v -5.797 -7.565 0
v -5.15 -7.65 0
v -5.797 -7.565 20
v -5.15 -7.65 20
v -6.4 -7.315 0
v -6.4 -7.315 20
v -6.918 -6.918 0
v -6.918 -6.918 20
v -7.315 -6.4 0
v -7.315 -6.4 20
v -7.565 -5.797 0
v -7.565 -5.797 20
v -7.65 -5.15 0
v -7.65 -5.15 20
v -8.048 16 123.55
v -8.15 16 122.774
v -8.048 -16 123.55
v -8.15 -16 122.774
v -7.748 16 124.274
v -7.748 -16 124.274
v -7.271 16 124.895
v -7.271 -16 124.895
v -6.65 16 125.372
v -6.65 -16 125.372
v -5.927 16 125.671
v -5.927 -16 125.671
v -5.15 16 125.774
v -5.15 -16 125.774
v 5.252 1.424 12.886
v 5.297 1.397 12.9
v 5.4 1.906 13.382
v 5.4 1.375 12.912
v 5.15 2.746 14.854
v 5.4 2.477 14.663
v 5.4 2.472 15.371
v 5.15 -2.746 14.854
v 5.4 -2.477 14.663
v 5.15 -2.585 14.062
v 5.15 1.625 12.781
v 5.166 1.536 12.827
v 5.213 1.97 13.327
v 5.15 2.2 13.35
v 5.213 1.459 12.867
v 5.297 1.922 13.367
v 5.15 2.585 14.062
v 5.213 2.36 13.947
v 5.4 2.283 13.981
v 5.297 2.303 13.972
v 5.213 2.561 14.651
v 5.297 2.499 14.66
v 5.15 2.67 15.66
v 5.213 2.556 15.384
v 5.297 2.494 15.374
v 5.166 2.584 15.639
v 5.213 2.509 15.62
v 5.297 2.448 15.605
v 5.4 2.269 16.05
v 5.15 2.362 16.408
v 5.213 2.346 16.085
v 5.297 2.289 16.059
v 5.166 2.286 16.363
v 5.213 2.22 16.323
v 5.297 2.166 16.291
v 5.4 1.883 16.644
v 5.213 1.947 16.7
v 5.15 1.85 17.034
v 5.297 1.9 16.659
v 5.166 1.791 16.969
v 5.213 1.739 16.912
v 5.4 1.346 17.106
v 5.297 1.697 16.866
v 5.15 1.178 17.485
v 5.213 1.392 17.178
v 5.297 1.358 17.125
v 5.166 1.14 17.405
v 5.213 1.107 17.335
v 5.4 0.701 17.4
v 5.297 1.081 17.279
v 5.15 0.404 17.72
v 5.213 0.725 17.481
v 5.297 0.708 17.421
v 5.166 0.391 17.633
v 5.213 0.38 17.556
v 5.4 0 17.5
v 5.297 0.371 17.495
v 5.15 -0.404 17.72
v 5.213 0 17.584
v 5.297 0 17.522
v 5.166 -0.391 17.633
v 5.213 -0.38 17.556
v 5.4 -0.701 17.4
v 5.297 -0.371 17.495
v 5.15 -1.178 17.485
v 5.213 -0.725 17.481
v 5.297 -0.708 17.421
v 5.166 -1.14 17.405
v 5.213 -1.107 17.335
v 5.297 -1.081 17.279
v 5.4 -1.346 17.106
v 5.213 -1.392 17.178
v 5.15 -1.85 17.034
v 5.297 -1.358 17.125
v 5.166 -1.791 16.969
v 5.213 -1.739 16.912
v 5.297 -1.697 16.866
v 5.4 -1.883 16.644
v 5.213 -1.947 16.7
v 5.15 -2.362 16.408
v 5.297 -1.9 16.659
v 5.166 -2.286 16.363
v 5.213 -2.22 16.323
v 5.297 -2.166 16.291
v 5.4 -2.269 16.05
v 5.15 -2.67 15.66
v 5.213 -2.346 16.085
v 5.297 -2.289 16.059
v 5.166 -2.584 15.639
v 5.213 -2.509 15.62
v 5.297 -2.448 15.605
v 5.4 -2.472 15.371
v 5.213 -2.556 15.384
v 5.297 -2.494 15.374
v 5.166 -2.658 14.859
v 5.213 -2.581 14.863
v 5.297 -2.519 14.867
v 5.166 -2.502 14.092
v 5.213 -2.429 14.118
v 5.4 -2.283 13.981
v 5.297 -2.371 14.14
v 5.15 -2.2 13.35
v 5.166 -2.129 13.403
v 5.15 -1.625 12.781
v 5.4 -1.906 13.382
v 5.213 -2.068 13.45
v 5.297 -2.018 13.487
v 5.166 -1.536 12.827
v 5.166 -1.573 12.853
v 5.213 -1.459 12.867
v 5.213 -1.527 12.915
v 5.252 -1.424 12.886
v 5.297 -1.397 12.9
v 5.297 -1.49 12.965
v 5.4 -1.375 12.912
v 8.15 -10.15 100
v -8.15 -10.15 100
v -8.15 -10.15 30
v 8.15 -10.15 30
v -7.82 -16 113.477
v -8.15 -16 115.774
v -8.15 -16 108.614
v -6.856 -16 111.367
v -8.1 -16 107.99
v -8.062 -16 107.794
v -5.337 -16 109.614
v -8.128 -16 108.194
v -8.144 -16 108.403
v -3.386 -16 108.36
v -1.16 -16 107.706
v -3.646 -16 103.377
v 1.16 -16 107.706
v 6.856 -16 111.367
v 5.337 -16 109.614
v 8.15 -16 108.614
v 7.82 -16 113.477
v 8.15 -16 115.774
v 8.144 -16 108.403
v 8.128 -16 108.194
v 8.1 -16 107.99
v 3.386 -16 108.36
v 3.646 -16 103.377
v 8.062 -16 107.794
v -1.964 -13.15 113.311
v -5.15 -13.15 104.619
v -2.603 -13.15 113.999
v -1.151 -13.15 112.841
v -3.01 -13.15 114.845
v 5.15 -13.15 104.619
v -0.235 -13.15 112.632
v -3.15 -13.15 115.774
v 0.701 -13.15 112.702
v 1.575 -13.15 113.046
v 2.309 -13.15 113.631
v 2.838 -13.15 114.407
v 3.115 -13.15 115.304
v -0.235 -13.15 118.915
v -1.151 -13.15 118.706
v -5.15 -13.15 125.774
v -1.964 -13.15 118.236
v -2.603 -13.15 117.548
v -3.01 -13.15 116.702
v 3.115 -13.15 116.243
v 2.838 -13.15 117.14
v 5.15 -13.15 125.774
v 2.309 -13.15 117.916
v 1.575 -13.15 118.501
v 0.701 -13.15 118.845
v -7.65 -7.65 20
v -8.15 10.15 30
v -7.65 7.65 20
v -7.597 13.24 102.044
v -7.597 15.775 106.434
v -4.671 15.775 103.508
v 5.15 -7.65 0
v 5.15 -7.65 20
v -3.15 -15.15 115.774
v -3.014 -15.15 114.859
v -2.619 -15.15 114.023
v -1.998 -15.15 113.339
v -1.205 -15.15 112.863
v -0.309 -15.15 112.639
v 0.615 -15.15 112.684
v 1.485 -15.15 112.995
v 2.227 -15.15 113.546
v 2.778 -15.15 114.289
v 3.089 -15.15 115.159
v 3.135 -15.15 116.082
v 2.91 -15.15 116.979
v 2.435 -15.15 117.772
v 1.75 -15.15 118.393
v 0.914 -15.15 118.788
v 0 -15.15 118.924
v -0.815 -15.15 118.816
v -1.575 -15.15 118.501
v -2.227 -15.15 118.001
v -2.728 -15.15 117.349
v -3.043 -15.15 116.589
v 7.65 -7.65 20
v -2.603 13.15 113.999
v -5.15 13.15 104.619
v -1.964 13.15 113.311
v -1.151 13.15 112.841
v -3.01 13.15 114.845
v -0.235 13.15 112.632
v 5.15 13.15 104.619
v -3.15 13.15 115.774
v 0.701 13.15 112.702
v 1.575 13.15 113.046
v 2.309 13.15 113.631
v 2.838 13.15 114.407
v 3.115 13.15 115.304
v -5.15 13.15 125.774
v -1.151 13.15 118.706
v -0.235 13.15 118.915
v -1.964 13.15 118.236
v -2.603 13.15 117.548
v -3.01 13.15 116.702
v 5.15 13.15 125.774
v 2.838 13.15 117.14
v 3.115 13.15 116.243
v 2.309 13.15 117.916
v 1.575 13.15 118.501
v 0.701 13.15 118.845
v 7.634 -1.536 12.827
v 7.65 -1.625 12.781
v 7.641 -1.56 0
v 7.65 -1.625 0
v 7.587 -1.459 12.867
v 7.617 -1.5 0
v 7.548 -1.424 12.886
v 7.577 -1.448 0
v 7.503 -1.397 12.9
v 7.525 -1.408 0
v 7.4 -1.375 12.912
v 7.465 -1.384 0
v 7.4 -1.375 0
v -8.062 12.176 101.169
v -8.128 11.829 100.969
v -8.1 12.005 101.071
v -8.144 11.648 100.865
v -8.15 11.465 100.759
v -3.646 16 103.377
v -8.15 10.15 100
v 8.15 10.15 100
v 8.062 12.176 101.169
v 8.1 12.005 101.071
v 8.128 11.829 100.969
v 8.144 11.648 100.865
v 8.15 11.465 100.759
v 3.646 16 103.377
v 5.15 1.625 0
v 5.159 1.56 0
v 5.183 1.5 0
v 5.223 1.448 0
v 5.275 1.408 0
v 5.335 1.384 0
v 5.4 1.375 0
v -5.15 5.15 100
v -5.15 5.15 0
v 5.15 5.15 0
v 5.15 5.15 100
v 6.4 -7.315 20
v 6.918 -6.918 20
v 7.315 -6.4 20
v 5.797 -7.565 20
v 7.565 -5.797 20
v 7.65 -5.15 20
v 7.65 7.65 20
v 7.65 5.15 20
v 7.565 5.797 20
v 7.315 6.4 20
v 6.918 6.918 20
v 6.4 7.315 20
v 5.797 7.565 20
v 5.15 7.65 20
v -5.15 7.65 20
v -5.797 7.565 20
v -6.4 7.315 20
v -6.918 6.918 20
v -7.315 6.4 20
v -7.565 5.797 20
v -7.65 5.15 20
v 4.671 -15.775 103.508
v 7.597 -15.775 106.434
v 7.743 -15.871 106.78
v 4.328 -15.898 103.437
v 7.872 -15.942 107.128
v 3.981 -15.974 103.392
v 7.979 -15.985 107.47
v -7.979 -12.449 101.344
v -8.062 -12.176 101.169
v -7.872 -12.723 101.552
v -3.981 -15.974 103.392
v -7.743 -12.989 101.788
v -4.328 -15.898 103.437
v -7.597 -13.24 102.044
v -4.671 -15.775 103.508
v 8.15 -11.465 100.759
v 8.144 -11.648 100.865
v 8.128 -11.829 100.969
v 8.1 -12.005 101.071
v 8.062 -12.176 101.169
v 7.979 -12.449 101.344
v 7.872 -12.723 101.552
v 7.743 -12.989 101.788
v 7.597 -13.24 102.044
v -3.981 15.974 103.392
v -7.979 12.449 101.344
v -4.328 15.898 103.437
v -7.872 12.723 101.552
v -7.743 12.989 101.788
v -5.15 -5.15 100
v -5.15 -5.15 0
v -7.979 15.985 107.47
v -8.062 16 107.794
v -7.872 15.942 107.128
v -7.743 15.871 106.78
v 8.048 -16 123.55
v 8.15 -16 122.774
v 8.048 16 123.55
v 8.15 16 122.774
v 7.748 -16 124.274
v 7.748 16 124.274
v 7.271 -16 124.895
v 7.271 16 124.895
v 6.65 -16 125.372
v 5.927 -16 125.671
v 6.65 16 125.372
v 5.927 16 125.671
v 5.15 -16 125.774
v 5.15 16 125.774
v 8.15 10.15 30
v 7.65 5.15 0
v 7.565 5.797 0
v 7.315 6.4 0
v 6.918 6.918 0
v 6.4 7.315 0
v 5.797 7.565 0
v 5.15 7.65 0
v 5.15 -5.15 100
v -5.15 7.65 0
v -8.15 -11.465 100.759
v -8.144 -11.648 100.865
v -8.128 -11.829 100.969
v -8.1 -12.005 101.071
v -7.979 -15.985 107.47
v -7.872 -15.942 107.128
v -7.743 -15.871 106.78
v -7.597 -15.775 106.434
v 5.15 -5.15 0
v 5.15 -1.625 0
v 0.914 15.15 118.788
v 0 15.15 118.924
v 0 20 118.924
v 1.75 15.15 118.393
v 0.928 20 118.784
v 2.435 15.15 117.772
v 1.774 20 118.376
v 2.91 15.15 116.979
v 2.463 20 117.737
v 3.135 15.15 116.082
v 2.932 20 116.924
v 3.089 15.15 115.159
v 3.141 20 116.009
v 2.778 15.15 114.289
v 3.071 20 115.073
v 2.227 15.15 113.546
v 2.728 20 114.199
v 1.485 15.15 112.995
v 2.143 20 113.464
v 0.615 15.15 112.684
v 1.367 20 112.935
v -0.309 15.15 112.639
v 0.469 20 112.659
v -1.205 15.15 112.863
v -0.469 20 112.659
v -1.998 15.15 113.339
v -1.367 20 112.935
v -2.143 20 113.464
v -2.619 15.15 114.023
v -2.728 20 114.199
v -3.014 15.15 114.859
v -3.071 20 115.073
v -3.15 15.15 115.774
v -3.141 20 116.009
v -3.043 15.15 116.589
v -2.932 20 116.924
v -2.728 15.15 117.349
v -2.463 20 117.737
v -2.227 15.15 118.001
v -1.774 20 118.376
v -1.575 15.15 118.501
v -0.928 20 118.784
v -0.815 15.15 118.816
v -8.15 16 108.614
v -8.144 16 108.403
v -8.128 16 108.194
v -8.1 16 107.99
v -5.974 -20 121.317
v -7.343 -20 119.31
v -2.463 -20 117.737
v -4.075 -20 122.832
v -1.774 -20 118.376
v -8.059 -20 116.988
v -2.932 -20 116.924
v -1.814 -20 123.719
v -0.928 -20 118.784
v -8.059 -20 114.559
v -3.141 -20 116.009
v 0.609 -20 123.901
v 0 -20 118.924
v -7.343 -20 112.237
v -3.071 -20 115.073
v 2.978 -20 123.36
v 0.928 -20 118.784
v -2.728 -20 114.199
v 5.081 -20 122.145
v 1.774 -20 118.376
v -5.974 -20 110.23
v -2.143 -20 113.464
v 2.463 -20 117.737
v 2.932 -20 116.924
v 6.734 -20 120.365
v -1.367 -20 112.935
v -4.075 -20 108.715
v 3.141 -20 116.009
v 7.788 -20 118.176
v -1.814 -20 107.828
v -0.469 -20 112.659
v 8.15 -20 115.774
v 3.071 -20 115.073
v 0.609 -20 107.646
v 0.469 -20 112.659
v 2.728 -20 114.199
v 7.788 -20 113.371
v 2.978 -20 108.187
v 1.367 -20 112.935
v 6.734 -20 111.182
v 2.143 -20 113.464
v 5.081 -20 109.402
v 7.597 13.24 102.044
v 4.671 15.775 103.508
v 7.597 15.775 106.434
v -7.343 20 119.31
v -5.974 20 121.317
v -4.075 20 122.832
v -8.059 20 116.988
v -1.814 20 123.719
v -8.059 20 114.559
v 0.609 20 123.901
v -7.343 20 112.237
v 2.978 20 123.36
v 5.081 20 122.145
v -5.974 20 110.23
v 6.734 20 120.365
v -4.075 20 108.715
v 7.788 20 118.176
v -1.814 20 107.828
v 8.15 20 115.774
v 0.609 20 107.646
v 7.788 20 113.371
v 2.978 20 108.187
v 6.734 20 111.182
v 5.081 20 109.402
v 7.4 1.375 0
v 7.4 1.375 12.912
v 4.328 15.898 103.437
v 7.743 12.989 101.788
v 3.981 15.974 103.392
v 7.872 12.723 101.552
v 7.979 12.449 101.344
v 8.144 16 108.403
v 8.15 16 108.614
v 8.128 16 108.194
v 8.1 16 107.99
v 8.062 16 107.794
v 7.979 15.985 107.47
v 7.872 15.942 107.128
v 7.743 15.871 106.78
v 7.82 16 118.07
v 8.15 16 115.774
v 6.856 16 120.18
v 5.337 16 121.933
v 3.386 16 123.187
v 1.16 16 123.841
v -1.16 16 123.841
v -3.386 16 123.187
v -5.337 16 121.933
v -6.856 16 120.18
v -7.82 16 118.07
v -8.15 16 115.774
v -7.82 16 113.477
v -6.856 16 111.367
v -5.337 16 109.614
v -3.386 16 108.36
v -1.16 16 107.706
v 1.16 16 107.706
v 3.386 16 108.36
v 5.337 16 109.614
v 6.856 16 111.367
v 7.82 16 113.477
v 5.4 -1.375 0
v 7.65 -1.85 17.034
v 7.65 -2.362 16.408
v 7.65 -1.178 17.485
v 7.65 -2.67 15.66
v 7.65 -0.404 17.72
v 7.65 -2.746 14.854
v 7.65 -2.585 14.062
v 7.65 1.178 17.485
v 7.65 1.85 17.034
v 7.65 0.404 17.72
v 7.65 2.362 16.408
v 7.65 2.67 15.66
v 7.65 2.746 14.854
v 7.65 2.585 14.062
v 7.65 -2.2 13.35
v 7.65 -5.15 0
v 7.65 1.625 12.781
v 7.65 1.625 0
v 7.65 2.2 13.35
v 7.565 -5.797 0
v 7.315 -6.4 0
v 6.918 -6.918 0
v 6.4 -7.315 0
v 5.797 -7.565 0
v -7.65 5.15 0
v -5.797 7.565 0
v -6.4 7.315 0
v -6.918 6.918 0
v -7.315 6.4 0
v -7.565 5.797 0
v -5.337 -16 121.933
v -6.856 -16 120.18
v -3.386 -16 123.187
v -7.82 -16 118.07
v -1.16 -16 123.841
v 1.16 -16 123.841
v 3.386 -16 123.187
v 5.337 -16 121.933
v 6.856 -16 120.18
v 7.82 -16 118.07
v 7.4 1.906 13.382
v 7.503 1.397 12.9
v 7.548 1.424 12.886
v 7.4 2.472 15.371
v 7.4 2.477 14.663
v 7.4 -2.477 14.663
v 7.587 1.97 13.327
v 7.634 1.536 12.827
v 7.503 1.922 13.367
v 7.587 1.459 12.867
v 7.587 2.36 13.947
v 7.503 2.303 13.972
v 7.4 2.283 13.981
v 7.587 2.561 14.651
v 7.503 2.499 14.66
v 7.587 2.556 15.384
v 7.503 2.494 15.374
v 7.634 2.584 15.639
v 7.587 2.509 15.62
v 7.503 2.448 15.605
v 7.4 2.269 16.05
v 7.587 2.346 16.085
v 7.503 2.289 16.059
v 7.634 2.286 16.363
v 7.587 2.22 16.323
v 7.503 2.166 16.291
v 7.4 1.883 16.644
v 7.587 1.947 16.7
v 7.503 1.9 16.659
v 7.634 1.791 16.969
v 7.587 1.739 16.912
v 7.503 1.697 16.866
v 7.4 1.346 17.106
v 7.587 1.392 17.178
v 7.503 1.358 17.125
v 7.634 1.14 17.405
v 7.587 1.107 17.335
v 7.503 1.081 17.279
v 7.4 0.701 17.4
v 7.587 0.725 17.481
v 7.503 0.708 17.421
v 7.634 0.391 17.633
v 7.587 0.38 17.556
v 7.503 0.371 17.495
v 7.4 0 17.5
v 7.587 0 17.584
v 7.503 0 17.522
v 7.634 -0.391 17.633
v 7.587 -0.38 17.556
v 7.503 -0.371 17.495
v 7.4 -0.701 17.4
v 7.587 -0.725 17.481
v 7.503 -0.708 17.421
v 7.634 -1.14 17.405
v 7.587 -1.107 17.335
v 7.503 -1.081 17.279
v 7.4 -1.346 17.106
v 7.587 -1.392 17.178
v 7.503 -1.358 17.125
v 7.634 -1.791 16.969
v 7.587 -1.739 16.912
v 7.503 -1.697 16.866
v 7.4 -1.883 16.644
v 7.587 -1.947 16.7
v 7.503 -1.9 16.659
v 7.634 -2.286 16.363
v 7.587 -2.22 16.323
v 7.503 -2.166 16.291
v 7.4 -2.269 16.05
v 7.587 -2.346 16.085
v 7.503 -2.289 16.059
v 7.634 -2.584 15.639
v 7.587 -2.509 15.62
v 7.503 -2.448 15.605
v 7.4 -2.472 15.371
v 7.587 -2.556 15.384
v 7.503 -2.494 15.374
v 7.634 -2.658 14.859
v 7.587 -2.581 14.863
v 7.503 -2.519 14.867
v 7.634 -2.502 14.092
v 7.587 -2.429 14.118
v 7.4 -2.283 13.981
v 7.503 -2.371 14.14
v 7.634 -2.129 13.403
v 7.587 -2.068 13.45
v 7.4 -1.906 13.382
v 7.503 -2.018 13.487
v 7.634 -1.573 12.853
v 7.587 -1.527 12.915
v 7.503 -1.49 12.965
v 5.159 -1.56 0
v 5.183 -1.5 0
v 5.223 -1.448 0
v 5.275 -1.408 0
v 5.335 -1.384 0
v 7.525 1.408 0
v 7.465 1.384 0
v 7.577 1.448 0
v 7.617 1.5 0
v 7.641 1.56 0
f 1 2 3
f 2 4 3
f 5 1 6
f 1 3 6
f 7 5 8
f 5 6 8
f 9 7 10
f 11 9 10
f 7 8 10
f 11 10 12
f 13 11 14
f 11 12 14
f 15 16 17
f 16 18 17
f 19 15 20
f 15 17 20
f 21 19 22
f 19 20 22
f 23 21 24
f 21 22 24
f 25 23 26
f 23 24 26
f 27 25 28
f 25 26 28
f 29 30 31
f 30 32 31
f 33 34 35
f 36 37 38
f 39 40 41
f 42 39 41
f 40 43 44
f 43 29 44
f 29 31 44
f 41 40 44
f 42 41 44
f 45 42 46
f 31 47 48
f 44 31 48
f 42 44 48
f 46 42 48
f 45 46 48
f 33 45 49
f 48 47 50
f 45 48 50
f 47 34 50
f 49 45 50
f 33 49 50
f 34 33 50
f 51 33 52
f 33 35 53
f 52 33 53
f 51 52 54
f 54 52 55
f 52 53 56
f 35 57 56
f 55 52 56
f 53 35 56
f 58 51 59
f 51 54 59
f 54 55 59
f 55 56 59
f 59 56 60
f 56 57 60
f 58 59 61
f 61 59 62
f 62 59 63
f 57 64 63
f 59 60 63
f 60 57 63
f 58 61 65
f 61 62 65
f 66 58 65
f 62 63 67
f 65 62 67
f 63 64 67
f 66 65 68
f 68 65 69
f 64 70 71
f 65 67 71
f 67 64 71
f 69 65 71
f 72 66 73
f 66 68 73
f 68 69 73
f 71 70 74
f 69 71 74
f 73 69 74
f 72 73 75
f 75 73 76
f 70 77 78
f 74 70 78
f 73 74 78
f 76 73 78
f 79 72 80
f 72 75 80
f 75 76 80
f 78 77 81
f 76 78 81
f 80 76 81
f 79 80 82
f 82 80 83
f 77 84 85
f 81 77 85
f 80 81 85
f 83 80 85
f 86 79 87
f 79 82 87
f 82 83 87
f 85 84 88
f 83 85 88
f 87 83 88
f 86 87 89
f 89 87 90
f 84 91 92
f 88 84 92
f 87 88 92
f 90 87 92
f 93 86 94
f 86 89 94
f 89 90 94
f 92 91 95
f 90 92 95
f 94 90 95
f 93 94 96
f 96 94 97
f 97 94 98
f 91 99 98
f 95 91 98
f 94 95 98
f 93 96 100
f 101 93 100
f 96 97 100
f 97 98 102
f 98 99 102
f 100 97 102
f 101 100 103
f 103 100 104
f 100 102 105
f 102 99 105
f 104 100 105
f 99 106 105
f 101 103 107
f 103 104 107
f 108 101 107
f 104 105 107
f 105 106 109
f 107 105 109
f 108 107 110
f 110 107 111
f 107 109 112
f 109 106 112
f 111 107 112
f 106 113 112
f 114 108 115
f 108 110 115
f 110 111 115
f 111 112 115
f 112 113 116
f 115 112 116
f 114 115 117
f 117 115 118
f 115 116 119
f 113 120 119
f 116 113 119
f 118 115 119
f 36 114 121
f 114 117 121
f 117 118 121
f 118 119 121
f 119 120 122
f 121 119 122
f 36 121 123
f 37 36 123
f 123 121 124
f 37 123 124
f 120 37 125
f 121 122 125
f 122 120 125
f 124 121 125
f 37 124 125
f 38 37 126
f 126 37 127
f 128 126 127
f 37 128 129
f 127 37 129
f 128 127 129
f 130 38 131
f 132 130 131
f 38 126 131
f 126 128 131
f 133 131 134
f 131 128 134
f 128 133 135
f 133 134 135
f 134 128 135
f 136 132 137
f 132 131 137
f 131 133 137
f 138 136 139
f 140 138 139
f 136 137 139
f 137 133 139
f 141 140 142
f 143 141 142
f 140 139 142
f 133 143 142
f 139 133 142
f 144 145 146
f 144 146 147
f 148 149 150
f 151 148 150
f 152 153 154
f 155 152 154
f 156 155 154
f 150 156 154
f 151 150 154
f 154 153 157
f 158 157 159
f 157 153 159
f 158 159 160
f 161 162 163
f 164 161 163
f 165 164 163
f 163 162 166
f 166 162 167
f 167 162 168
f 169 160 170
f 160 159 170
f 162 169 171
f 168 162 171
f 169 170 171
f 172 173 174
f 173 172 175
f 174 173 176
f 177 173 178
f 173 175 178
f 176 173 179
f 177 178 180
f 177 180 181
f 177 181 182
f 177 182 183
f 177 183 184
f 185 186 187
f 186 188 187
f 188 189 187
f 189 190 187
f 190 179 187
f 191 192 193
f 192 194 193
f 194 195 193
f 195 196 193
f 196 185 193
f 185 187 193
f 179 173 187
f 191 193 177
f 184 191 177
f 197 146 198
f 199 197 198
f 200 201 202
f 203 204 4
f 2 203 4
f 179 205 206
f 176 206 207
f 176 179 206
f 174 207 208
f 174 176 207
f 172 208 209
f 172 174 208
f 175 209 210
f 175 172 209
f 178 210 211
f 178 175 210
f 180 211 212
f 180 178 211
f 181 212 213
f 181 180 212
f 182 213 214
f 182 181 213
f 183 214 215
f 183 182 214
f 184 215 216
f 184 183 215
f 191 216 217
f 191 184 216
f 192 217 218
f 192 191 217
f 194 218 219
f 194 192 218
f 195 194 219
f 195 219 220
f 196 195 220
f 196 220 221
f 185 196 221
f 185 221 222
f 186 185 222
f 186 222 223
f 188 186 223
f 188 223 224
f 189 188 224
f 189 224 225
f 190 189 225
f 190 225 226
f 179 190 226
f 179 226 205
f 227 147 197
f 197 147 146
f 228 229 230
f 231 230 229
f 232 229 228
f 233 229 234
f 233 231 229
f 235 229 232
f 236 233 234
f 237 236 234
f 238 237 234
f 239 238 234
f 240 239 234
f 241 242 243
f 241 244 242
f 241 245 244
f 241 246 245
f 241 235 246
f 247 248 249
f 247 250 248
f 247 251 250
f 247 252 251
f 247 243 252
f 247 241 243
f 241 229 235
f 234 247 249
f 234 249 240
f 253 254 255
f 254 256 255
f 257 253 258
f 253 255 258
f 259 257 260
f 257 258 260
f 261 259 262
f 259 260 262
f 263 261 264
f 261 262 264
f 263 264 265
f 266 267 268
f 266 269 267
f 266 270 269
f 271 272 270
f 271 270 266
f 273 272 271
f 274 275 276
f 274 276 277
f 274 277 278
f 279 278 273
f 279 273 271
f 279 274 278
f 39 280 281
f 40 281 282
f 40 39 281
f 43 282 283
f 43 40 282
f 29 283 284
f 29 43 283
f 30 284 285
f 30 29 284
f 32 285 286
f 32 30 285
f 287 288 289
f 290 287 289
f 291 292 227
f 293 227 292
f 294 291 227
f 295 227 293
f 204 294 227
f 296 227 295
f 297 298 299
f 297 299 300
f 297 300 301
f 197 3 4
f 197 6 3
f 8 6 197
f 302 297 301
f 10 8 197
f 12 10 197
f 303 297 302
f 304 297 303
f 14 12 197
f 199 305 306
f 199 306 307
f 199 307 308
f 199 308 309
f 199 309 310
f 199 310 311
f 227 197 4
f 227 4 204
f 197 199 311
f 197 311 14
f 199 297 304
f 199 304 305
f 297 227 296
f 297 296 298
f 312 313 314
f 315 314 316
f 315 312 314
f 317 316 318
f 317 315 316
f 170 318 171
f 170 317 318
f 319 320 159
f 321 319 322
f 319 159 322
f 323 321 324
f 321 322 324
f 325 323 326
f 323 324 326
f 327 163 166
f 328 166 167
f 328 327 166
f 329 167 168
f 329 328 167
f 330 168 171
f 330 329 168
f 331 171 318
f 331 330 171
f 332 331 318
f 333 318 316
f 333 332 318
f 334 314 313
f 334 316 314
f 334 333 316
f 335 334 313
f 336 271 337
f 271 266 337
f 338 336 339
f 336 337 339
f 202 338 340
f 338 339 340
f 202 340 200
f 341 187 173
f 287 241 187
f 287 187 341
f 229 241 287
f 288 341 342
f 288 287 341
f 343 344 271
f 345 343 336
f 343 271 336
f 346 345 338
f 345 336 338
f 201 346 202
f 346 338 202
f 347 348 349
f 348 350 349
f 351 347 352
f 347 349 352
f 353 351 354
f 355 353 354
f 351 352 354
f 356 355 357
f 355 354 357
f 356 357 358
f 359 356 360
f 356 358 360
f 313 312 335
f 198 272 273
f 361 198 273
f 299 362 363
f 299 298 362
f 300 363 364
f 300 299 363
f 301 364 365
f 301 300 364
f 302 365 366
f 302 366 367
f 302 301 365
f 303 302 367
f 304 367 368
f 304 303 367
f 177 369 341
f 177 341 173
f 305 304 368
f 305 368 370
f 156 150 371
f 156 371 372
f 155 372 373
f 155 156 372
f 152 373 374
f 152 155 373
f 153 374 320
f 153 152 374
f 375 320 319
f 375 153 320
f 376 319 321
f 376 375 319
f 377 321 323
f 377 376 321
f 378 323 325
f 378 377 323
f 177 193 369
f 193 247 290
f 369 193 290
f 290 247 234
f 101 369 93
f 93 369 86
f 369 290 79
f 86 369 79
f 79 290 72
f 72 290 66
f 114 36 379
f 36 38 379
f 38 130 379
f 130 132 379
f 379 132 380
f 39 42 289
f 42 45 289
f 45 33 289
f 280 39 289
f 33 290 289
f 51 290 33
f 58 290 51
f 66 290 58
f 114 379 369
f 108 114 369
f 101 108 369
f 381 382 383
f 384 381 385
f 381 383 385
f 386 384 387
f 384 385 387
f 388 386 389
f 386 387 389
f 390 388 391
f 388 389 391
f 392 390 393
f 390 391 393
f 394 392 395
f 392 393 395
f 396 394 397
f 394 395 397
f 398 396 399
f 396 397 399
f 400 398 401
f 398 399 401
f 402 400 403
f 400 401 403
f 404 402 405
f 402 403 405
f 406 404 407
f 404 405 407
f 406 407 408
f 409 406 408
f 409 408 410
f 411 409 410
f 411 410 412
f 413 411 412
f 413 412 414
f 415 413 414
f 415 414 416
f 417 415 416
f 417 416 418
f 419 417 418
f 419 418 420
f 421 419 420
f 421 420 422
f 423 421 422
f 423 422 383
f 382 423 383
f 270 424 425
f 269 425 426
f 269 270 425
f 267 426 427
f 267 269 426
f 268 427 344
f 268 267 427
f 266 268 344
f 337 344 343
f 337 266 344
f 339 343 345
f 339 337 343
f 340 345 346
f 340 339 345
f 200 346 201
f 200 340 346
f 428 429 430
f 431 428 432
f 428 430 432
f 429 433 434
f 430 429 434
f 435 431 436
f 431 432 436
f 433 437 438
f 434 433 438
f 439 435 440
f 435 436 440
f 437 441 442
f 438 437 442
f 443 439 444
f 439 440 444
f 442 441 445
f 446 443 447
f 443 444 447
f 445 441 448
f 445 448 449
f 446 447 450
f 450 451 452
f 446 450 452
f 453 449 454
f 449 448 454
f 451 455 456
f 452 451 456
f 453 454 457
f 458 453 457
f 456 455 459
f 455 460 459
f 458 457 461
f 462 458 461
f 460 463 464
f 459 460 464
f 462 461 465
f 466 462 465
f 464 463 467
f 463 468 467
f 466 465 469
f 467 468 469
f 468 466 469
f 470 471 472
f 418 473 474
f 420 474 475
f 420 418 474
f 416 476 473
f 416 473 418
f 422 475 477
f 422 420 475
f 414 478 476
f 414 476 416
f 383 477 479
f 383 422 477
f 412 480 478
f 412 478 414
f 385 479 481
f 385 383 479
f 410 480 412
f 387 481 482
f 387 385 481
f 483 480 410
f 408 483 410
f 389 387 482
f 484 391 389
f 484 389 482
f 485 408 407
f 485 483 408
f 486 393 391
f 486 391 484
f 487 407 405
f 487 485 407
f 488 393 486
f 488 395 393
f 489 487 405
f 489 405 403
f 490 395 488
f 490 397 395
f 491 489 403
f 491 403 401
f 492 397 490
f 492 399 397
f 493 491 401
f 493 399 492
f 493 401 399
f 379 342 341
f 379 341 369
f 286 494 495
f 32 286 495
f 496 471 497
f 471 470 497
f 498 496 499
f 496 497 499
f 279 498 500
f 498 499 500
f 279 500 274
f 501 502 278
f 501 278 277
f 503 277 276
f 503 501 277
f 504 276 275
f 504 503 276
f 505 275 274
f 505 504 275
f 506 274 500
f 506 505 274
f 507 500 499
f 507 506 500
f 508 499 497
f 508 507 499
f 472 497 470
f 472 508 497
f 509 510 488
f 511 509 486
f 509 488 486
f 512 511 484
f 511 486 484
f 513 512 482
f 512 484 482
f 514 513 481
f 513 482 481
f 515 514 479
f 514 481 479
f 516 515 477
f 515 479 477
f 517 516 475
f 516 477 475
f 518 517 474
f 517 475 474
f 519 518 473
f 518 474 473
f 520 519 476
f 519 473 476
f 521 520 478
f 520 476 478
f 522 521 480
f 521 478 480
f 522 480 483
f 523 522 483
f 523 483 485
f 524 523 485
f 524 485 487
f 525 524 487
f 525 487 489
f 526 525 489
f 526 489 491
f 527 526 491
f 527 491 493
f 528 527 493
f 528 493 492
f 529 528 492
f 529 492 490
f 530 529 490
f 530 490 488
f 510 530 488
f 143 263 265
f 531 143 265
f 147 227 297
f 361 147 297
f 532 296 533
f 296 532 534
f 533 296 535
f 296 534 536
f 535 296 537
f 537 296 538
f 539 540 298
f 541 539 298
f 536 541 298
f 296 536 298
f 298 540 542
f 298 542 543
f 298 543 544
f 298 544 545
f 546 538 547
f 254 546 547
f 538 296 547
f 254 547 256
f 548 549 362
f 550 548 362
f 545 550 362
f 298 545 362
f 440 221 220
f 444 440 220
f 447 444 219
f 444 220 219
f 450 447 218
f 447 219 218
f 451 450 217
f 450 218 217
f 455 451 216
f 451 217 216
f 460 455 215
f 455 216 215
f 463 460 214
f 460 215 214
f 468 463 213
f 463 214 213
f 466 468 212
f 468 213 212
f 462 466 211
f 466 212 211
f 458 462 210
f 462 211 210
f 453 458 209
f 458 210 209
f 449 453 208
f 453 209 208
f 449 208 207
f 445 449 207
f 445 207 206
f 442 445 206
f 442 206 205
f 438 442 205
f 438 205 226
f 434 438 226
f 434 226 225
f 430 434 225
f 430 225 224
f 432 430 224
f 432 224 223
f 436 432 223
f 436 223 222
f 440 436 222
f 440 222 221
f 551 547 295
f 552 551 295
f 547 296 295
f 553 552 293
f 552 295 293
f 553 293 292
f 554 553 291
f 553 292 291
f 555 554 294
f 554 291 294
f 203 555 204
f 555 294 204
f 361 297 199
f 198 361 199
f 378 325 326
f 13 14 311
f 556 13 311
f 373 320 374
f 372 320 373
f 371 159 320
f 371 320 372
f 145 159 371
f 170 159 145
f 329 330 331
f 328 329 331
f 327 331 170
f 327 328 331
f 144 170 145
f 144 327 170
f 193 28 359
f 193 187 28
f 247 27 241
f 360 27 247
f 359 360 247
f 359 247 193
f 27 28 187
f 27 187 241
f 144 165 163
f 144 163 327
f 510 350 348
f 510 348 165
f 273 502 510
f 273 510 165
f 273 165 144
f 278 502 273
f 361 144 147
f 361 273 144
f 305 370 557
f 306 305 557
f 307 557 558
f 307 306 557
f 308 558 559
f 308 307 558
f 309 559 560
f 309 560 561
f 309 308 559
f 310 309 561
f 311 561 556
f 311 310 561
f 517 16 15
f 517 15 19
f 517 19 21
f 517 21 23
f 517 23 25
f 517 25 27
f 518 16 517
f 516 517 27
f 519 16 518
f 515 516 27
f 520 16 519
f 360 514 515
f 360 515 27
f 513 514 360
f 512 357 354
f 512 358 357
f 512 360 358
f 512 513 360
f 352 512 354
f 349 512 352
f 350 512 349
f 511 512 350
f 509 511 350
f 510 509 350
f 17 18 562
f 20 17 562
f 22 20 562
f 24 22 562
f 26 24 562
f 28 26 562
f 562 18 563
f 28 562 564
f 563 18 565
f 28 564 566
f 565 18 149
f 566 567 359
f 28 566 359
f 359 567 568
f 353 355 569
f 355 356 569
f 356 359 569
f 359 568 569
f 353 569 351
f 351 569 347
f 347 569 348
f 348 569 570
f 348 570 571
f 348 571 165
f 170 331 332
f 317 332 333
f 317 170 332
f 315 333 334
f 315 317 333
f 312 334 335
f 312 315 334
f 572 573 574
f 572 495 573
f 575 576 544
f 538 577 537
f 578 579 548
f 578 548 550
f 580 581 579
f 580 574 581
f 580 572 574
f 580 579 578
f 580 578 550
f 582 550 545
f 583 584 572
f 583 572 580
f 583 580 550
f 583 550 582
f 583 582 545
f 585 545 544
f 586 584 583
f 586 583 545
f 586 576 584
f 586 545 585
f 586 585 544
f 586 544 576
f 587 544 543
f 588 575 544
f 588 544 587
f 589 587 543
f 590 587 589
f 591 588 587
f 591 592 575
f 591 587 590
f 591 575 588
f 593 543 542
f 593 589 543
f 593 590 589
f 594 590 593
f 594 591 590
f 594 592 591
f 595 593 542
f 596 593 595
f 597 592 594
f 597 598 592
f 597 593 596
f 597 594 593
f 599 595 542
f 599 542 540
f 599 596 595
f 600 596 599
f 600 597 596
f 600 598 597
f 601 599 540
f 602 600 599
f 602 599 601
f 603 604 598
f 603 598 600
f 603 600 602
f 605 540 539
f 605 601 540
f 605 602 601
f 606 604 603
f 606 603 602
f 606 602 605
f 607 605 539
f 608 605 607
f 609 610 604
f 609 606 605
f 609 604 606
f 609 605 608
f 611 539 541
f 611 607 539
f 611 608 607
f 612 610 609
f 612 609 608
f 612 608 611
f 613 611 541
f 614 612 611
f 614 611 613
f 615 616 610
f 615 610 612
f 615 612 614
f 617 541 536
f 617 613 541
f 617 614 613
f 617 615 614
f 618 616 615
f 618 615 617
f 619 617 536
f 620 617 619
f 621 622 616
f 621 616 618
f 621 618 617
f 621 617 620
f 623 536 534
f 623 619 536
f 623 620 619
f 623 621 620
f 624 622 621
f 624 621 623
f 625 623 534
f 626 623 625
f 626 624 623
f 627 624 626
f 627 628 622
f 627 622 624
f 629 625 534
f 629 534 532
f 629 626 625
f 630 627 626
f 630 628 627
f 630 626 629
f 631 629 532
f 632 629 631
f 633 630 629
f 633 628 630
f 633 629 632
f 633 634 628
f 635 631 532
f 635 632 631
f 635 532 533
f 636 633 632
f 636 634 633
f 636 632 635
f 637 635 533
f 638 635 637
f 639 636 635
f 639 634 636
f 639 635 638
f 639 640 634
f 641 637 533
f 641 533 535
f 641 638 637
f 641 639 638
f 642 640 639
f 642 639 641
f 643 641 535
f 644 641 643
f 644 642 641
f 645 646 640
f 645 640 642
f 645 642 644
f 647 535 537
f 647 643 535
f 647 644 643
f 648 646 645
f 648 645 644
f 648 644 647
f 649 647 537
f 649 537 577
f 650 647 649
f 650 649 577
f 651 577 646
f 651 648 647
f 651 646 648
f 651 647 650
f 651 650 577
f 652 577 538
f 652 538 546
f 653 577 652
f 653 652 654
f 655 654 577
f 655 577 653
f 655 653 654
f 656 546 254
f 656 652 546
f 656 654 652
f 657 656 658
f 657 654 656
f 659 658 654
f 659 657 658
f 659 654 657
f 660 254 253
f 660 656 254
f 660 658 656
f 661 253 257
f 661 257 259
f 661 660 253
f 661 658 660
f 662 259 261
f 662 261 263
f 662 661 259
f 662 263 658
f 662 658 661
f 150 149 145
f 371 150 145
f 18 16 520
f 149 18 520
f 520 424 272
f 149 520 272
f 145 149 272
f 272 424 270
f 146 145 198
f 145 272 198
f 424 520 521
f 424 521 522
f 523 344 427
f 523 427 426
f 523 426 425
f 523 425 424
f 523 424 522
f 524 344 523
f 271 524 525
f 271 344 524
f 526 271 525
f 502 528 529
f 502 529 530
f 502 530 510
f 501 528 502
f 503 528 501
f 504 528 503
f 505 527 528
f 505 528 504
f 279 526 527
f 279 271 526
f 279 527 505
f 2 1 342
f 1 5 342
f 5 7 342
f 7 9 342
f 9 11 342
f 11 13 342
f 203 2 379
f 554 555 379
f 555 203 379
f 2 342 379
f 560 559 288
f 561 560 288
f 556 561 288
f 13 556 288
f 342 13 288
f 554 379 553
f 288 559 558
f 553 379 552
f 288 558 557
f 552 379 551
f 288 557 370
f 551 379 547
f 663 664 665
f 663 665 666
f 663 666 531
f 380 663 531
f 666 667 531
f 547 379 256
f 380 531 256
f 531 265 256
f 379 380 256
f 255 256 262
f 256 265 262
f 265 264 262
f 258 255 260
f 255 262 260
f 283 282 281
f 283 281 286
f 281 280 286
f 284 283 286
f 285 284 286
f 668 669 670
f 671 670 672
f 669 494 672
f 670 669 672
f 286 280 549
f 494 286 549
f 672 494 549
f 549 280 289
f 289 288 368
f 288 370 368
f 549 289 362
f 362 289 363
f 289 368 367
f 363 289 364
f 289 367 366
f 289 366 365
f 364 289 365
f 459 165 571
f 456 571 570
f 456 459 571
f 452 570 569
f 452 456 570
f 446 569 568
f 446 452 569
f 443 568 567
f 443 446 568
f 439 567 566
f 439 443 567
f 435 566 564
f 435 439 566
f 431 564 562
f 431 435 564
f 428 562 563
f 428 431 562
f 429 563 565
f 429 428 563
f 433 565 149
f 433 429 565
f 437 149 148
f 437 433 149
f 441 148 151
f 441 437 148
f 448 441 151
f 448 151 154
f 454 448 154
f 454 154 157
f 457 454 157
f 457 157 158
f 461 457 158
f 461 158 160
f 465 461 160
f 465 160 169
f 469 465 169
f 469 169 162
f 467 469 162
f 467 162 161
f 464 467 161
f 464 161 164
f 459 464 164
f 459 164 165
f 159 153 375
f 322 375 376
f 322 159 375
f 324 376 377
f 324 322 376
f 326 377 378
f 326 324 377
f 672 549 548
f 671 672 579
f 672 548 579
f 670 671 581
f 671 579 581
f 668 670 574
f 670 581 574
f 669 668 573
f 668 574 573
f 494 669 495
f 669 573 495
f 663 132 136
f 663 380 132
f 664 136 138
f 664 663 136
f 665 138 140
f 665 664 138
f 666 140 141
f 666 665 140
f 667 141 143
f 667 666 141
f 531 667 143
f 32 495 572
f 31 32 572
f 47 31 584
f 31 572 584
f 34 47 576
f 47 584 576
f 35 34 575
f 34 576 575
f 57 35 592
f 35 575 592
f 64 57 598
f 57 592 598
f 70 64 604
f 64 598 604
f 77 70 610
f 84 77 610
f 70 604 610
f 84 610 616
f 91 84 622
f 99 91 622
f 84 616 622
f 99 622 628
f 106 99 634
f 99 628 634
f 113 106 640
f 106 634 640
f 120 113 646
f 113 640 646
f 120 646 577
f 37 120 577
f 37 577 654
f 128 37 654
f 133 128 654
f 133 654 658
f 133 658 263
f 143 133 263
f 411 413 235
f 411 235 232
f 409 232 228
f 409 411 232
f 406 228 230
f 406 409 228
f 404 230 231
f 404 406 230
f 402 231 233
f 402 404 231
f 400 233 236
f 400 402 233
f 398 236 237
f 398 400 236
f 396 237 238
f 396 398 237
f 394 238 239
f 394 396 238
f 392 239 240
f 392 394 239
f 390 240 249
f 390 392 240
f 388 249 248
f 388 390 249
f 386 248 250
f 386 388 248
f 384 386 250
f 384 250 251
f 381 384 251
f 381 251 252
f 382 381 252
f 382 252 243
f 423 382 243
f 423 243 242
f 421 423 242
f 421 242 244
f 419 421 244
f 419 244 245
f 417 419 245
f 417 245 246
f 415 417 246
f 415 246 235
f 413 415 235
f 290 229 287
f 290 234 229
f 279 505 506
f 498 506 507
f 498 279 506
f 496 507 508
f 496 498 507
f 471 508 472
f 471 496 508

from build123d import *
from OCP.BRepFilletAPI import BRepFilletAPI_MakeChamfer

# Parameters (mm, degrees)
SKETCH_1_W          = 16.3
SKETCH_1_H          = 20.3
SKETCH_1_W_2        = 10.3
SKETCH_1_H_2        = 10.3
EXTRUDE_1_DEPTH     = 100
SKETCH_2_W          = 16.3
SKETCH_2_H          = 20.3
SKETCH_2_W_2        = 15.3
SKETCH_2_H_2        = 15.3
CUT_EXTRUDE_1_DEPTH = 20
CHAMFER_1_SIZE      = 2.5
CHAMFER_1_SIZE_2    = 10
CUT_EXTRUDE_2_REACH = 103.748
FILLET_1_R          = 0.25
FILLET_2_R          = 2.5
EXTRUDE_2_REACH     = 103.827
EXTRUDE_3_DEPTH     = 3
EXTRUDE_START       = -16.3
EXTRUDE_4_DEPTH     = 3
SKETCH_5_R          = 3.15
CUT_EXTRUDE_3_DEPTH = 133.323416217
SKETCH_6_W          = 16.3
SKETCH_6_H          = 30
SKETCH_6_R          = 3.15
CUT_EXTRUDE_4_DEPTH = 0.15
CUT_EXTRUDE_START   = -40.15
SKETCH_6_2_W        = 16.3
SKETCH_6_2_H        = 10
SKETCH_6_2_H_2      = 20
SKETCH_6_2_R        = 3.15
CUT_EXTRUDE_5_DEPTH = 0.15
CHAMFER_2_SIZE      = 0.5
CHAMFER_2_SIZE_2    = 10
SKETCH_7_R          = 15
SKETCH_7_W          = 16.3
SKETCH_7_H          = 20.08660254
CUT_EXTRUDE_6_DEPTH = 4
SKETCH_8_W          = 10.3
SKETCH_8_H          = 21.501273041
SKETCH_8_R          = 3.15
EXTRUDE_5_DEPTH     = 2
EXTRUDE_START_2     = 28.3
SKETCH_8_2_W        = 10.3
SKETCH_8_2_H        = 1.501273041
SKETCH_8_2_H_2      = 20
SKETCH_8_2_R        = 3.15
EXTRUDE_6_DEPTH     = 2
FILLET_3_R          = 3
CHAMFER_START       = 29
CHAMFER_3_OUTLINE_W = 8
CHAMFER_3_OUTLINE_H = 9
CHAMFER_3_DEPTH     = 2.982339926
CHAMFER_START_2     = -31.982339926
CHAMFER_4_OUTLINE_W = 8
CHAMFER_4_OUTLINE_H = 9
CHAMFER_4_DEPTH     = 1.788854382
CHAMFER_5_OUTLINE_W = 8
CHAMFER_5_OUTLINE_H = 9
CHAMFER_5_DEPTH     = 2.982339926
CHAMFER_6_OUTLINE_W = 8
CHAMFER_6_OUTLINE_H = 9
CHAMFER_6_DEPTH     = 1.788854382
FILLET_4_R          = 1


with BuildPart() as part:
    # 草图1 → 凸台-拉伸1 (new body)
    with BuildSketch(Plane.XY):
        Rectangle(SKETCH_1_W, SKETCH_1_H)
        Rectangle(SKETCH_1_W_2, SKETCH_1_H_2, mode=Mode.SUBTRACT)
    extrude(amount=EXTRUDE_1_DEPTH)

    # 草图2 → 切除-拉伸1 (cut)
    with BuildSketch(Plane(origin=(0, 0, 0), x_dir=(-1, 0, 0), z_dir=(0, 0, -1))):
        Rectangle(SKETCH_2_W, SKETCH_2_H)
        Rectangle(SKETCH_2_W_2, SKETCH_2_H_2, mode=Mode.SUBTRACT)
    extrude(amount=-CUT_EXTRUDE_1_DEPTH, mode=Mode.SUBTRACT)

    # 倒角1
    chamfer_1_edges_1 = [part.edges().sort_by_distance(p)[0] for p in [
        (0, -10.15, 20),
    ]]
    chamfer_1_side_1 = [part.faces().sort_by_distance(p)[0] for p in [
        (0, -10.1, 20),
    ]]
    chamfer_1_edges_2 = [part.edges().sort_by_distance(p)[0] for p in [
        (0, 10.15, 20),
    ]]
    chamfer_1_side_2 = [part.faces().sort_by_distance(p)[0] for p in [
        (0, 10.15, 20.05),
    ]]
    chamfer_1 = BRepFilletAPI_MakeChamfer(part.part.solid().wrapped)
    for e in chamfer_1_edges_1:
        chamfer_1.Add(CHAMFER_1_SIZE - 0.0001, CHAMFER_1_SIZE_2 - 0.0001, e.wrapped, chamfer_1_side_1[0].wrapped)
    for e in chamfer_1_edges_2:
        chamfer_1.Add(CHAMFER_1_SIZE_2 - 0.0001, CHAMFER_1_SIZE - 0.0001, e.wrapped, chamfer_1_side_2[0].wrapped)
    add(Compound.cast(chamfer_1.Shape()), mode=Mode.REPLACE)  # a hair under: the kernel refuses the full size

    # 草图3 → 切除-拉伸2 (cut, up to next)
    with BuildSketch(Plane(origin=(7.65, 0, 0), x_dir=(0, 0, -1), z_dir=(1, 0, 0)), mode=Mode.PRIVATE) as cut_extrude_2_sk1:
        with BuildLine():
            Line((0, 1.375), (-12.912088364, 1.375))
            ThreePointArc((-12.912088364, 1.375), (-12.605237059, 0.717711958), (-12.5, 0))
            ThreePointArc((-12.5, 0), (-12.605237059, -0.717711958), (-12.912088364, -1.375))
            Line((-12.912088364, -1.375), (0, -1.375))
            Line((0, -1.375), (0, 1.375))
        make_face()
    cut_extrude_2_tool1 = extrude(cut_extrude_2_sk1.sketch, amount=-CUT_EXTRUDE_2_REACH, mode=Mode.PRIVATE) & part.part
    # 草图3 → 切除-拉伸2 (cut, up to next)
    with BuildSketch(Plane(origin=(7.65, 0, 0), x_dir=(0, 0, -1), z_dir=(1, 0, 0)), mode=Mode.PRIVATE) as cut_extrude_2_sk2:
        with BuildLine():
            Line((-15, -1.375), (-15, 1.375))
            Line((-15, 1.375), (-12.912088364, 1.375))
            ThreePointArc((-12.912088364, 1.375), (-17.5, 0), (-12.912088364, -1.375))
            Line((-12.912088364, -1.375), (-15, -1.375))
        make_face()
    cut_extrude_2_tool2 = extrude(cut_extrude_2_sk2.sketch, amount=-CUT_EXTRUDE_2_REACH, mode=Mode.PRIVATE) & part.part
    # 草图3 → 切除-拉伸2 (cut, up to next)
    with BuildSketch(Plane(origin=(7.65, 0, 0), x_dir=(0, 0, -1), z_dir=(1, 0, 0)), mode=Mode.PRIVATE) as cut_extrude_2_sk3:
        with BuildLine():
            Line((-12.912088364, 1.375), (-15, 1.375))
            Line((-15, 1.375), (-15, -1.375))
            Line((-15, -1.375), (-12.912088364, -1.375))
            ThreePointArc((-12.912088364, -1.375), (-12.605237059, -0.717711958), (-12.5, 0))
            ThreePointArc((-12.5, 0), (-12.605237059, 0.717711958), (-12.912088364, 1.375))
        make_face()
    cut_extrude_2_tool3 = extrude(cut_extrude_2_sk3.sketch, amount=-CUT_EXTRUDE_2_REACH, mode=Mode.PRIVATE) & part.part
    # 草图3 → 切除-拉伸2 (cut, up to next)
    with BuildSketch(Plane(origin=(7.65, 0, 0), x_dir=(0, 0, -1), z_dir=(1, 0, 0)), mode=Mode.PRIVATE) as cut_extrude_2_sk4:
        with BuildLine():
            Line((-15, -1.375), (-15, 1.375))
            Line((-15, 1.375), (-12.912088364, 1.375))
            ThreePointArc((-12.912088364, 1.375), (-17.5, 0), (-12.912088364, -1.375))
            Line((-12.912088364, -1.375), (-15, -1.375))
        make_face()
    cut_extrude_2_tool4 = extrude(cut_extrude_2_sk4.sketch, amount=-CUT_EXTRUDE_2_REACH, mode=Mode.PRIVATE) & part.part
    # 草图3 → 切除-拉伸2 (cut, up to next)
    with BuildSketch(Plane(origin=(7.65, 0, 0), x_dir=(0, 0, -1), z_dir=(1, 0, 0)), mode=Mode.PRIVATE) as cut_extrude_2_sk5:
        with BuildLine():
            Line((-12.912088364, 1.375), (-15, 1.375))
            Line((-15, 1.375), (-15, -1.375))
            Line((-15, -1.375), (-12.912088364, -1.375))
            ThreePointArc((-12.912088364, -1.375), (-12.605237059, -0.717711958), (-12.5, 0))
            ThreePointArc((-12.5, 0), (-12.605237059, 0.717711958), (-12.912088364, 1.375))
        make_face()
    cut_extrude_2_tool5 = extrude(cut_extrude_2_sk5.sketch, amount=-CUT_EXTRUDE_2_REACH, mode=Mode.PRIVATE) & part.part
    add(cut_extrude_2_tool1.solids().sort_by_distance((7.65, 0, 6.316826))[0], mode=Mode.SUBTRACT)
    add(cut_extrude_2_tool2.solids().sort_by_distance((7.65, 0, 15.588772))[0], mode=Mode.SUBTRACT)
    add(cut_extrude_2_tool3.solids().sort_by_distance((7.65, 0, 13.813143))[0], mode=Mode.SUBTRACT)
    add(cut_extrude_2_tool4.solids().sort_by_distance((7.65, 0, 15.588772))[0], mode=Mode.SUBTRACT)
    add(cut_extrude_2_tool5.solids().sort_by_distance((7.65, 0, 13.813143))[0], mode=Mode.SUBTRACT)

    # 圆角1
    fillet_1_edges = [part.edges().sort_by_distance(p)[0] for p in [
        (5.15, 0, 17.5),
        (7.65, 1.375, 6.456044182),
        (5.15, -1.375, 6.456044182),
        (7.65, 0, 17.5),
        (7.65, -1.375, 6.456044182),
        (5.15, 1.375, 6.456044182),
    ]]
    fillet(fillet_1_edges, radius=FILLET_1_R)

    # 圆角2
    fillet_2_edges = [part.edges().sort_by_distance(p)[0] for p in [
        (-7.65, 7.65, 10),
        (7.65, 7.65, 10),
        (7.65, -7.65, 10),
        (-7.65, -7.65, 10),
    ]]
    fillet(fillet_2_edges, radius=FILLET_2_R)

    # 凸台-拉伸2: up to this face of the body (flat: up to its plane)
    extrude_2_end = Plane(part.part.faces().sort_by_distance((-8.15, 0, 60.573246373))[0])
    # 草图4 → 凸台-拉伸2 (add, up to the picked face)
    with BuildSketch(Plane(origin=(8.15, 0, 0), x_dir=(0, 0, -1), z_dir=(1, 0, 0)), mode=Mode.PRIVATE) as extrude_2_sk1:
        Polygon((-100, 5.15), (-100, 10.15), (-105.773502692, 20.15), (-125.773502692, 20.15), (-125.773502692, 15.15), (-105.773502692, 15.15), align=None)
    extrude_2_tool1 = split(extrude(extrude_2_sk1.sketch, amount=-EXTRUDE_2_REACH, mode=Mode.PRIVATE), bisect_by=extrude_2_end, keep=Keep.BOTH, mode=Mode.PRIVATE)
    # 草图4 → 凸台-拉伸2 (add, up to the picked face)
    with BuildSketch(Plane(origin=(8.15, 0, 0), x_dir=(0, 0, -1), z_dir=(1, 0, 0)), mode=Mode.PRIVATE) as extrude_2_sk2:
        Polygon((-100, -10.15), (-100, -5.15), (-105.773502692, -15.15), (-125.773502692, -15.15), (-125.773502692, -20.15), (-105.773502692, -20.15), align=None)
    extrude_2_tool2 = split(extrude(extrude_2_sk2.sketch, amount=-EXTRUDE_2_REACH, mode=Mode.PRIVATE), bisect_by=extrude_2_end, keep=Keep.BOTH, mode=Mode.PRIVATE)
    add(extrude_2_tool1.solids().sort_by(Axis((8.15, 16.529954, 112.886751), (-1, 0, 0)))[0])
    add(extrude_2_tool2.solids().sort_by(Axis((8.15, -16.529954, 112.886751), (-1, 0, 0)))[0])

    # 草图4<3> → 凸台-拉伸3 (add)
    with BuildSketch(Plane(origin=(8.15, 0, 0), x_dir=(0, 0, -1), z_dir=(1, 0, 0))):
        Polygon((-100, -5.15), (-100, 5.15), (-105.773502692, 15.15), (-125.773502692, 15.15), (-125.773502692, -15.15), (-105.773502692, -15.15), align=None)
    extrude(amount=-EXTRUDE_3_DEPTH)

    # 草图4<4> → 凸台-拉伸4 (add)
    with BuildSketch(Plane(origin=(8.15, 0, 0), x_dir=(0, 0, -1), z_dir=(1, 0, 0)).offset(EXTRUDE_START)):
        Polygon((-100, -5.15), (-100, 5.15), (-105.773502692, 15.15), (-125.773502692, 15.15), (-125.773502692, -15.15), (-105.773502692, -15.15), align=None)
    extrude(amount=EXTRUDE_4_DEPTH)

    # 草图5 → 切除-拉伸3 (cut, through all)
    with BuildSketch(Plane(origin=(0, 20.15, 0), x_dir=(1, 0, 0), z_dir=(0, 1, 0))):
        with Locations(Location((0, -115.773502692, 0), (0, 0, 270))):
            Circle(SKETCH_5_R)
    extrude(amount=-CUT_EXTRUDE_3_DEPTH, mode=Mode.SUBTRACT)

    # 草图6 → 切除-拉伸4 (cut)
    with BuildSketch(Plane(origin=(0, 20.15, 0), x_dir=(1, 0, 0), z_dir=(0, 1, 0))):
        with Locations((0, -110.773502692)):
            Rectangle(SKETCH_6_W, SKETCH_6_H)
        with Locations(Location((0, -115.773502692, 0), (0, 0, 180))):
            Circle(SKETCH_6_R, mode=Mode.SUBTRACT)
    extrude(amount=-CUT_EXTRUDE_4_DEPTH, mode=Mode.SUBTRACT)

    # 草图6<2> → 切除-拉伸5 (cut)
    # profile 1 of 2: a face of its own
    with BuildSketch(Plane(origin=(0, 20.15, 0), x_dir=(1, 0, 0), z_dir=(0, 1, 0)).offset(CUT_EXTRUDE_START)):
        with Locations((0, -100.773502692)):
            Rectangle(SKETCH_6_2_W, SKETCH_6_2_H)
    # profile 2 of 2: a face of its own
    with BuildSketch(Plane(origin=(0, 20.15, 0), x_dir=(1, 0, 0), z_dir=(0, 1, 0)).offset(CUT_EXTRUDE_START)):
        with Locations((0, -115.773502692)):
            Rectangle(SKETCH_6_2_W, SKETCH_6_2_H_2)
        with Locations(Location((0, -115.773502692, 0), (0, 0, 180))):
            Circle(SKETCH_6_2_R, mode=Mode.SUBTRACT)
    extrude(amount=-CUT_EXTRUDE_5_DEPTH, mode=Mode.SUBTRACT)

    # 倒角2
    chamfer_2_edges_1 = [part.edges().sort_by_distance(p)[0] for p in [
        (-8.15, 0, 20),
    ]]
    chamfer_2_side_1 = [part.faces().sort_by_distance(p)[0] for p in [
        (-8.14, 0, 20),
    ]]
    chamfer_2_edges_2 = [part.edges().sort_by_distance(p)[0] for p in [
        (8.15, 0, 20),
    ]]
    chamfer_2_side_2 = [part.faces().sort_by_distance(p)[0] for p in [
        (8.15, 0, 20.01),
    ]]
    chamfer_2 = BRepFilletAPI_MakeChamfer(part.part.solid().wrapped)
    for e in chamfer_2_edges_1:
        chamfer_2.Add(CHAMFER_2_SIZE - 0.0001, CHAMFER_2_SIZE_2 - 0.0001, e.wrapped, chamfer_2_side_1[0].wrapped)
    for e in chamfer_2_edges_2:
        chamfer_2.Add(CHAMFER_2_SIZE_2 - 0.0001, CHAMFER_2_SIZE - 0.0001, e.wrapped, chamfer_2_side_2[0].wrapped)
    add(Compound.cast(chamfer_2.Shape()), mode=Mode.REPLACE)  # a hair under: the kernel refuses the full size

    # 草图7 → 切除-拉伸6 (cut)
    # profile 1 of 3: a face of its own
    with BuildSketch(Plane(origin=(0, 20, 0), x_dir=(1, 0, 0), z_dir=(0, 1, 0))):
        with Locations((0, -115.773502692)):
            Circle(SKETCH_7_R)
        with Locations((0, -115.730201422)):
            Rectangle(SKETCH_7_W, SKETCH_7_H, mode=Mode.SUBTRACT)
    # profile 2 of 3: a face of its own
    with BuildSketch(Plane(origin=(0, 20, 0), x_dir=(1, 0, 0), z_dir=(0, 1, 0))):
        with BuildLine():
            Line((8.15, -125.773502692), (8.15, -115.773502692))
            ThreePointArc((8.15, -115.773502692), (1.2e-08, -123.923502692), (-8.15, -115.773502716))
            Line((-8.15, -115.773502716), (-8.15, -125.773502692))
            Line((-8.15, -125.773502692), (8.15, -125.773502692))
        make_face()
    # profile 3 of 3: a face of its own
    with BuildSketch(Plane(origin=(0, 20, 0), x_dir=(1, 0, 0), z_dir=(0, 1, 0))):
        with BuildLine():
            ThreePointArc((-8.15, -115.773502716), (-1.2e-08, -107.623502692), (8.15, -115.773502692))
            Line((8.15, -115.773502692), (8.15, -105.686900152))
            Line((8.15, -105.686900152), (-8.15, -105.686900152))
            Line((-8.15, -105.686900152), (-8.15, -115.773502716))
        make_face()
    cut_extrude_6 = extrude(amount=-CUT_EXTRUDE_6_DEPTH, mode=Mode.SUBTRACT)

    # 镜向1: 切除-拉伸6 across plane
    add(cut_extrude_6.mirror(Plane.ZX), mode=Mode.SUBTRACT)

    # 草图8 → 凸台-拉伸5 (add)
    with BuildSketch(Plane.XZ.offset(-15.15)):
        with Locations((0, 115.022866171)):
            Rectangle(SKETCH_8_W, SKETCH_8_H)
        with Locations(Location((0, 115.773502692, 0), (0, 0, 180))):
            Circle(SKETCH_8_R, mode=Mode.SUBTRACT)
    extrude(amount=EXTRUDE_5_DEPTH)

    # 草图8<2> → 凸台-拉伸6 (add)
    # profile 1 of 2: a face of its own
    with BuildSketch(Plane.XZ.offset(-15.15).offset(EXTRUDE_START_2)):
        with Locations((0, 105.022866171)):
            Rectangle(SKETCH_8_2_W, SKETCH_8_2_H)
    # profile 2 of 2: a face of its own
    with BuildSketch(Plane.XZ.offset(-15.15).offset(EXTRUDE_START_2)):
        with Locations((0, 115.773502692)):
            Rectangle(SKETCH_8_2_W, SKETCH_8_2_H_2)
        with Locations(Location((0, 115.773502692, 0), (0, 0, 180))):
            Circle(SKETCH_8_2_R, mode=Mode.SUBTRACT)
    extrude(amount=EXTRUDE_6_DEPTH)

    # 圆角3
    fillet_3_edges = [part.edges().sort_by_distance(p)[0] for p in [
        (8.15, 0, 125.773502692),
        (-8.15, 0, 125.773502692),
    ]]
    fillet(fillet_3_edges, radius=FILLET_3_R - 0.0001)  # a hair under: the kernel refuses the full size

    # 倒角3: read off the stored shape, not the designer's step
    # 倒角3 outline → 倒角3 (cut)
    with BuildSketch(Plane(origin=(0, 0, 0), x_dir=(0.894427190999916, 0.387298334620742, -0.22360679774997855), z_dir=(0.447213595499958, -0.7745966692414838, 0.447213595499957)).offset(CHAMFER_START)):
        with Locations((-23, 97.5)):
            Rectangle(CHAMFER_3_OUTLINE_W, CHAMFER_3_OUTLINE_H)
    extrude(amount=CHAMFER_3_DEPTH, mode=Mode.SUBTRACT)

    # 倒角4: read off the stored shape, not the designer's step
    # 倒角4 outline → 倒角4 (cut)
    with BuildSketch(Plane(origin=(0, 0, 0), x_dir=(0.8944271909999162, -0.3872983346207414, 0.2236067977499782), z_dir=(0.44721359549995726, 0.7745966692414843, -0.4472135954999572)).offset(CHAMFER_START_2)):
        with Locations((23, -97.5)):
            Rectangle(CHAMFER_4_OUTLINE_W, CHAMFER_4_OUTLINE_H)
    extrude(amount=CHAMFER_4_DEPTH, mode=Mode.SUBTRACT)

    # 倒角5: read off the stored shape, not the designer's step
    # 倒角5 outline → 倒角5 (cut)
    with BuildSketch(Plane(origin=(0, 0, 0), x_dir=(0.8944271909999162, -0.3872983346207414, -0.2236067977499782), z_dir=(0.44721359549995726, 0.7745966692414843, 0.4472135954999572)).offset(CHAMFER_START)):
        with Locations((-23, -97.5)):
            Rectangle(CHAMFER_5_OUTLINE_W, CHAMFER_5_OUTLINE_H)
    extrude(amount=CHAMFER_5_DEPTH, mode=Mode.SUBTRACT)

    # 倒角6: read off the stored shape, not the designer's step
    # 倒角6 outline → 倒角6 (cut)
    with BuildSketch(Plane(origin=(0, 0, 0), x_dir=(0.8944271909999162, 0.3872983346207414, 0.2236067977499782), z_dir=(0.44721359549995726, -0.7745966692414843, -0.4472135954999572)).offset(CHAMFER_START_2)):
        with Locations((23, 97.5)):
            Rectangle(CHAMFER_6_OUTLINE_W, CHAMFER_6_OUTLINE_H)
    extrude(amount=CHAMFER_6_DEPTH, mode=Mode.SUBTRACT)

    # 圆角4
    fillet_4_edges = [part.edges().sort_by_distance(p)[0] for p in [
        (-8.15, 14.267949192, 104.377499075),
        (-6.15, 14.267949192, 102.377499075),
        (-6.15, 16, 105.377499075),
        (6.15, 16, 105.377499075),
        (6.15, 14.267949192, 102.377499075),
        (8.15, 14.267949192, 104.377499075),
        (-8.15, -14.267949192, 104.377499075),
        (-6.15, -14.267949192, 102.377499075),
        (-6.15, -16, 105.377499075),
        (6.15, -14.267949192, 102.377499075),
        (8.15, -14.267949192, 104.377499075),
        (6.15, -16, 105.377499075),
    ]]
    fillet(fillet_4_edges, radius=FILLET_4_R)


solid = part.part
